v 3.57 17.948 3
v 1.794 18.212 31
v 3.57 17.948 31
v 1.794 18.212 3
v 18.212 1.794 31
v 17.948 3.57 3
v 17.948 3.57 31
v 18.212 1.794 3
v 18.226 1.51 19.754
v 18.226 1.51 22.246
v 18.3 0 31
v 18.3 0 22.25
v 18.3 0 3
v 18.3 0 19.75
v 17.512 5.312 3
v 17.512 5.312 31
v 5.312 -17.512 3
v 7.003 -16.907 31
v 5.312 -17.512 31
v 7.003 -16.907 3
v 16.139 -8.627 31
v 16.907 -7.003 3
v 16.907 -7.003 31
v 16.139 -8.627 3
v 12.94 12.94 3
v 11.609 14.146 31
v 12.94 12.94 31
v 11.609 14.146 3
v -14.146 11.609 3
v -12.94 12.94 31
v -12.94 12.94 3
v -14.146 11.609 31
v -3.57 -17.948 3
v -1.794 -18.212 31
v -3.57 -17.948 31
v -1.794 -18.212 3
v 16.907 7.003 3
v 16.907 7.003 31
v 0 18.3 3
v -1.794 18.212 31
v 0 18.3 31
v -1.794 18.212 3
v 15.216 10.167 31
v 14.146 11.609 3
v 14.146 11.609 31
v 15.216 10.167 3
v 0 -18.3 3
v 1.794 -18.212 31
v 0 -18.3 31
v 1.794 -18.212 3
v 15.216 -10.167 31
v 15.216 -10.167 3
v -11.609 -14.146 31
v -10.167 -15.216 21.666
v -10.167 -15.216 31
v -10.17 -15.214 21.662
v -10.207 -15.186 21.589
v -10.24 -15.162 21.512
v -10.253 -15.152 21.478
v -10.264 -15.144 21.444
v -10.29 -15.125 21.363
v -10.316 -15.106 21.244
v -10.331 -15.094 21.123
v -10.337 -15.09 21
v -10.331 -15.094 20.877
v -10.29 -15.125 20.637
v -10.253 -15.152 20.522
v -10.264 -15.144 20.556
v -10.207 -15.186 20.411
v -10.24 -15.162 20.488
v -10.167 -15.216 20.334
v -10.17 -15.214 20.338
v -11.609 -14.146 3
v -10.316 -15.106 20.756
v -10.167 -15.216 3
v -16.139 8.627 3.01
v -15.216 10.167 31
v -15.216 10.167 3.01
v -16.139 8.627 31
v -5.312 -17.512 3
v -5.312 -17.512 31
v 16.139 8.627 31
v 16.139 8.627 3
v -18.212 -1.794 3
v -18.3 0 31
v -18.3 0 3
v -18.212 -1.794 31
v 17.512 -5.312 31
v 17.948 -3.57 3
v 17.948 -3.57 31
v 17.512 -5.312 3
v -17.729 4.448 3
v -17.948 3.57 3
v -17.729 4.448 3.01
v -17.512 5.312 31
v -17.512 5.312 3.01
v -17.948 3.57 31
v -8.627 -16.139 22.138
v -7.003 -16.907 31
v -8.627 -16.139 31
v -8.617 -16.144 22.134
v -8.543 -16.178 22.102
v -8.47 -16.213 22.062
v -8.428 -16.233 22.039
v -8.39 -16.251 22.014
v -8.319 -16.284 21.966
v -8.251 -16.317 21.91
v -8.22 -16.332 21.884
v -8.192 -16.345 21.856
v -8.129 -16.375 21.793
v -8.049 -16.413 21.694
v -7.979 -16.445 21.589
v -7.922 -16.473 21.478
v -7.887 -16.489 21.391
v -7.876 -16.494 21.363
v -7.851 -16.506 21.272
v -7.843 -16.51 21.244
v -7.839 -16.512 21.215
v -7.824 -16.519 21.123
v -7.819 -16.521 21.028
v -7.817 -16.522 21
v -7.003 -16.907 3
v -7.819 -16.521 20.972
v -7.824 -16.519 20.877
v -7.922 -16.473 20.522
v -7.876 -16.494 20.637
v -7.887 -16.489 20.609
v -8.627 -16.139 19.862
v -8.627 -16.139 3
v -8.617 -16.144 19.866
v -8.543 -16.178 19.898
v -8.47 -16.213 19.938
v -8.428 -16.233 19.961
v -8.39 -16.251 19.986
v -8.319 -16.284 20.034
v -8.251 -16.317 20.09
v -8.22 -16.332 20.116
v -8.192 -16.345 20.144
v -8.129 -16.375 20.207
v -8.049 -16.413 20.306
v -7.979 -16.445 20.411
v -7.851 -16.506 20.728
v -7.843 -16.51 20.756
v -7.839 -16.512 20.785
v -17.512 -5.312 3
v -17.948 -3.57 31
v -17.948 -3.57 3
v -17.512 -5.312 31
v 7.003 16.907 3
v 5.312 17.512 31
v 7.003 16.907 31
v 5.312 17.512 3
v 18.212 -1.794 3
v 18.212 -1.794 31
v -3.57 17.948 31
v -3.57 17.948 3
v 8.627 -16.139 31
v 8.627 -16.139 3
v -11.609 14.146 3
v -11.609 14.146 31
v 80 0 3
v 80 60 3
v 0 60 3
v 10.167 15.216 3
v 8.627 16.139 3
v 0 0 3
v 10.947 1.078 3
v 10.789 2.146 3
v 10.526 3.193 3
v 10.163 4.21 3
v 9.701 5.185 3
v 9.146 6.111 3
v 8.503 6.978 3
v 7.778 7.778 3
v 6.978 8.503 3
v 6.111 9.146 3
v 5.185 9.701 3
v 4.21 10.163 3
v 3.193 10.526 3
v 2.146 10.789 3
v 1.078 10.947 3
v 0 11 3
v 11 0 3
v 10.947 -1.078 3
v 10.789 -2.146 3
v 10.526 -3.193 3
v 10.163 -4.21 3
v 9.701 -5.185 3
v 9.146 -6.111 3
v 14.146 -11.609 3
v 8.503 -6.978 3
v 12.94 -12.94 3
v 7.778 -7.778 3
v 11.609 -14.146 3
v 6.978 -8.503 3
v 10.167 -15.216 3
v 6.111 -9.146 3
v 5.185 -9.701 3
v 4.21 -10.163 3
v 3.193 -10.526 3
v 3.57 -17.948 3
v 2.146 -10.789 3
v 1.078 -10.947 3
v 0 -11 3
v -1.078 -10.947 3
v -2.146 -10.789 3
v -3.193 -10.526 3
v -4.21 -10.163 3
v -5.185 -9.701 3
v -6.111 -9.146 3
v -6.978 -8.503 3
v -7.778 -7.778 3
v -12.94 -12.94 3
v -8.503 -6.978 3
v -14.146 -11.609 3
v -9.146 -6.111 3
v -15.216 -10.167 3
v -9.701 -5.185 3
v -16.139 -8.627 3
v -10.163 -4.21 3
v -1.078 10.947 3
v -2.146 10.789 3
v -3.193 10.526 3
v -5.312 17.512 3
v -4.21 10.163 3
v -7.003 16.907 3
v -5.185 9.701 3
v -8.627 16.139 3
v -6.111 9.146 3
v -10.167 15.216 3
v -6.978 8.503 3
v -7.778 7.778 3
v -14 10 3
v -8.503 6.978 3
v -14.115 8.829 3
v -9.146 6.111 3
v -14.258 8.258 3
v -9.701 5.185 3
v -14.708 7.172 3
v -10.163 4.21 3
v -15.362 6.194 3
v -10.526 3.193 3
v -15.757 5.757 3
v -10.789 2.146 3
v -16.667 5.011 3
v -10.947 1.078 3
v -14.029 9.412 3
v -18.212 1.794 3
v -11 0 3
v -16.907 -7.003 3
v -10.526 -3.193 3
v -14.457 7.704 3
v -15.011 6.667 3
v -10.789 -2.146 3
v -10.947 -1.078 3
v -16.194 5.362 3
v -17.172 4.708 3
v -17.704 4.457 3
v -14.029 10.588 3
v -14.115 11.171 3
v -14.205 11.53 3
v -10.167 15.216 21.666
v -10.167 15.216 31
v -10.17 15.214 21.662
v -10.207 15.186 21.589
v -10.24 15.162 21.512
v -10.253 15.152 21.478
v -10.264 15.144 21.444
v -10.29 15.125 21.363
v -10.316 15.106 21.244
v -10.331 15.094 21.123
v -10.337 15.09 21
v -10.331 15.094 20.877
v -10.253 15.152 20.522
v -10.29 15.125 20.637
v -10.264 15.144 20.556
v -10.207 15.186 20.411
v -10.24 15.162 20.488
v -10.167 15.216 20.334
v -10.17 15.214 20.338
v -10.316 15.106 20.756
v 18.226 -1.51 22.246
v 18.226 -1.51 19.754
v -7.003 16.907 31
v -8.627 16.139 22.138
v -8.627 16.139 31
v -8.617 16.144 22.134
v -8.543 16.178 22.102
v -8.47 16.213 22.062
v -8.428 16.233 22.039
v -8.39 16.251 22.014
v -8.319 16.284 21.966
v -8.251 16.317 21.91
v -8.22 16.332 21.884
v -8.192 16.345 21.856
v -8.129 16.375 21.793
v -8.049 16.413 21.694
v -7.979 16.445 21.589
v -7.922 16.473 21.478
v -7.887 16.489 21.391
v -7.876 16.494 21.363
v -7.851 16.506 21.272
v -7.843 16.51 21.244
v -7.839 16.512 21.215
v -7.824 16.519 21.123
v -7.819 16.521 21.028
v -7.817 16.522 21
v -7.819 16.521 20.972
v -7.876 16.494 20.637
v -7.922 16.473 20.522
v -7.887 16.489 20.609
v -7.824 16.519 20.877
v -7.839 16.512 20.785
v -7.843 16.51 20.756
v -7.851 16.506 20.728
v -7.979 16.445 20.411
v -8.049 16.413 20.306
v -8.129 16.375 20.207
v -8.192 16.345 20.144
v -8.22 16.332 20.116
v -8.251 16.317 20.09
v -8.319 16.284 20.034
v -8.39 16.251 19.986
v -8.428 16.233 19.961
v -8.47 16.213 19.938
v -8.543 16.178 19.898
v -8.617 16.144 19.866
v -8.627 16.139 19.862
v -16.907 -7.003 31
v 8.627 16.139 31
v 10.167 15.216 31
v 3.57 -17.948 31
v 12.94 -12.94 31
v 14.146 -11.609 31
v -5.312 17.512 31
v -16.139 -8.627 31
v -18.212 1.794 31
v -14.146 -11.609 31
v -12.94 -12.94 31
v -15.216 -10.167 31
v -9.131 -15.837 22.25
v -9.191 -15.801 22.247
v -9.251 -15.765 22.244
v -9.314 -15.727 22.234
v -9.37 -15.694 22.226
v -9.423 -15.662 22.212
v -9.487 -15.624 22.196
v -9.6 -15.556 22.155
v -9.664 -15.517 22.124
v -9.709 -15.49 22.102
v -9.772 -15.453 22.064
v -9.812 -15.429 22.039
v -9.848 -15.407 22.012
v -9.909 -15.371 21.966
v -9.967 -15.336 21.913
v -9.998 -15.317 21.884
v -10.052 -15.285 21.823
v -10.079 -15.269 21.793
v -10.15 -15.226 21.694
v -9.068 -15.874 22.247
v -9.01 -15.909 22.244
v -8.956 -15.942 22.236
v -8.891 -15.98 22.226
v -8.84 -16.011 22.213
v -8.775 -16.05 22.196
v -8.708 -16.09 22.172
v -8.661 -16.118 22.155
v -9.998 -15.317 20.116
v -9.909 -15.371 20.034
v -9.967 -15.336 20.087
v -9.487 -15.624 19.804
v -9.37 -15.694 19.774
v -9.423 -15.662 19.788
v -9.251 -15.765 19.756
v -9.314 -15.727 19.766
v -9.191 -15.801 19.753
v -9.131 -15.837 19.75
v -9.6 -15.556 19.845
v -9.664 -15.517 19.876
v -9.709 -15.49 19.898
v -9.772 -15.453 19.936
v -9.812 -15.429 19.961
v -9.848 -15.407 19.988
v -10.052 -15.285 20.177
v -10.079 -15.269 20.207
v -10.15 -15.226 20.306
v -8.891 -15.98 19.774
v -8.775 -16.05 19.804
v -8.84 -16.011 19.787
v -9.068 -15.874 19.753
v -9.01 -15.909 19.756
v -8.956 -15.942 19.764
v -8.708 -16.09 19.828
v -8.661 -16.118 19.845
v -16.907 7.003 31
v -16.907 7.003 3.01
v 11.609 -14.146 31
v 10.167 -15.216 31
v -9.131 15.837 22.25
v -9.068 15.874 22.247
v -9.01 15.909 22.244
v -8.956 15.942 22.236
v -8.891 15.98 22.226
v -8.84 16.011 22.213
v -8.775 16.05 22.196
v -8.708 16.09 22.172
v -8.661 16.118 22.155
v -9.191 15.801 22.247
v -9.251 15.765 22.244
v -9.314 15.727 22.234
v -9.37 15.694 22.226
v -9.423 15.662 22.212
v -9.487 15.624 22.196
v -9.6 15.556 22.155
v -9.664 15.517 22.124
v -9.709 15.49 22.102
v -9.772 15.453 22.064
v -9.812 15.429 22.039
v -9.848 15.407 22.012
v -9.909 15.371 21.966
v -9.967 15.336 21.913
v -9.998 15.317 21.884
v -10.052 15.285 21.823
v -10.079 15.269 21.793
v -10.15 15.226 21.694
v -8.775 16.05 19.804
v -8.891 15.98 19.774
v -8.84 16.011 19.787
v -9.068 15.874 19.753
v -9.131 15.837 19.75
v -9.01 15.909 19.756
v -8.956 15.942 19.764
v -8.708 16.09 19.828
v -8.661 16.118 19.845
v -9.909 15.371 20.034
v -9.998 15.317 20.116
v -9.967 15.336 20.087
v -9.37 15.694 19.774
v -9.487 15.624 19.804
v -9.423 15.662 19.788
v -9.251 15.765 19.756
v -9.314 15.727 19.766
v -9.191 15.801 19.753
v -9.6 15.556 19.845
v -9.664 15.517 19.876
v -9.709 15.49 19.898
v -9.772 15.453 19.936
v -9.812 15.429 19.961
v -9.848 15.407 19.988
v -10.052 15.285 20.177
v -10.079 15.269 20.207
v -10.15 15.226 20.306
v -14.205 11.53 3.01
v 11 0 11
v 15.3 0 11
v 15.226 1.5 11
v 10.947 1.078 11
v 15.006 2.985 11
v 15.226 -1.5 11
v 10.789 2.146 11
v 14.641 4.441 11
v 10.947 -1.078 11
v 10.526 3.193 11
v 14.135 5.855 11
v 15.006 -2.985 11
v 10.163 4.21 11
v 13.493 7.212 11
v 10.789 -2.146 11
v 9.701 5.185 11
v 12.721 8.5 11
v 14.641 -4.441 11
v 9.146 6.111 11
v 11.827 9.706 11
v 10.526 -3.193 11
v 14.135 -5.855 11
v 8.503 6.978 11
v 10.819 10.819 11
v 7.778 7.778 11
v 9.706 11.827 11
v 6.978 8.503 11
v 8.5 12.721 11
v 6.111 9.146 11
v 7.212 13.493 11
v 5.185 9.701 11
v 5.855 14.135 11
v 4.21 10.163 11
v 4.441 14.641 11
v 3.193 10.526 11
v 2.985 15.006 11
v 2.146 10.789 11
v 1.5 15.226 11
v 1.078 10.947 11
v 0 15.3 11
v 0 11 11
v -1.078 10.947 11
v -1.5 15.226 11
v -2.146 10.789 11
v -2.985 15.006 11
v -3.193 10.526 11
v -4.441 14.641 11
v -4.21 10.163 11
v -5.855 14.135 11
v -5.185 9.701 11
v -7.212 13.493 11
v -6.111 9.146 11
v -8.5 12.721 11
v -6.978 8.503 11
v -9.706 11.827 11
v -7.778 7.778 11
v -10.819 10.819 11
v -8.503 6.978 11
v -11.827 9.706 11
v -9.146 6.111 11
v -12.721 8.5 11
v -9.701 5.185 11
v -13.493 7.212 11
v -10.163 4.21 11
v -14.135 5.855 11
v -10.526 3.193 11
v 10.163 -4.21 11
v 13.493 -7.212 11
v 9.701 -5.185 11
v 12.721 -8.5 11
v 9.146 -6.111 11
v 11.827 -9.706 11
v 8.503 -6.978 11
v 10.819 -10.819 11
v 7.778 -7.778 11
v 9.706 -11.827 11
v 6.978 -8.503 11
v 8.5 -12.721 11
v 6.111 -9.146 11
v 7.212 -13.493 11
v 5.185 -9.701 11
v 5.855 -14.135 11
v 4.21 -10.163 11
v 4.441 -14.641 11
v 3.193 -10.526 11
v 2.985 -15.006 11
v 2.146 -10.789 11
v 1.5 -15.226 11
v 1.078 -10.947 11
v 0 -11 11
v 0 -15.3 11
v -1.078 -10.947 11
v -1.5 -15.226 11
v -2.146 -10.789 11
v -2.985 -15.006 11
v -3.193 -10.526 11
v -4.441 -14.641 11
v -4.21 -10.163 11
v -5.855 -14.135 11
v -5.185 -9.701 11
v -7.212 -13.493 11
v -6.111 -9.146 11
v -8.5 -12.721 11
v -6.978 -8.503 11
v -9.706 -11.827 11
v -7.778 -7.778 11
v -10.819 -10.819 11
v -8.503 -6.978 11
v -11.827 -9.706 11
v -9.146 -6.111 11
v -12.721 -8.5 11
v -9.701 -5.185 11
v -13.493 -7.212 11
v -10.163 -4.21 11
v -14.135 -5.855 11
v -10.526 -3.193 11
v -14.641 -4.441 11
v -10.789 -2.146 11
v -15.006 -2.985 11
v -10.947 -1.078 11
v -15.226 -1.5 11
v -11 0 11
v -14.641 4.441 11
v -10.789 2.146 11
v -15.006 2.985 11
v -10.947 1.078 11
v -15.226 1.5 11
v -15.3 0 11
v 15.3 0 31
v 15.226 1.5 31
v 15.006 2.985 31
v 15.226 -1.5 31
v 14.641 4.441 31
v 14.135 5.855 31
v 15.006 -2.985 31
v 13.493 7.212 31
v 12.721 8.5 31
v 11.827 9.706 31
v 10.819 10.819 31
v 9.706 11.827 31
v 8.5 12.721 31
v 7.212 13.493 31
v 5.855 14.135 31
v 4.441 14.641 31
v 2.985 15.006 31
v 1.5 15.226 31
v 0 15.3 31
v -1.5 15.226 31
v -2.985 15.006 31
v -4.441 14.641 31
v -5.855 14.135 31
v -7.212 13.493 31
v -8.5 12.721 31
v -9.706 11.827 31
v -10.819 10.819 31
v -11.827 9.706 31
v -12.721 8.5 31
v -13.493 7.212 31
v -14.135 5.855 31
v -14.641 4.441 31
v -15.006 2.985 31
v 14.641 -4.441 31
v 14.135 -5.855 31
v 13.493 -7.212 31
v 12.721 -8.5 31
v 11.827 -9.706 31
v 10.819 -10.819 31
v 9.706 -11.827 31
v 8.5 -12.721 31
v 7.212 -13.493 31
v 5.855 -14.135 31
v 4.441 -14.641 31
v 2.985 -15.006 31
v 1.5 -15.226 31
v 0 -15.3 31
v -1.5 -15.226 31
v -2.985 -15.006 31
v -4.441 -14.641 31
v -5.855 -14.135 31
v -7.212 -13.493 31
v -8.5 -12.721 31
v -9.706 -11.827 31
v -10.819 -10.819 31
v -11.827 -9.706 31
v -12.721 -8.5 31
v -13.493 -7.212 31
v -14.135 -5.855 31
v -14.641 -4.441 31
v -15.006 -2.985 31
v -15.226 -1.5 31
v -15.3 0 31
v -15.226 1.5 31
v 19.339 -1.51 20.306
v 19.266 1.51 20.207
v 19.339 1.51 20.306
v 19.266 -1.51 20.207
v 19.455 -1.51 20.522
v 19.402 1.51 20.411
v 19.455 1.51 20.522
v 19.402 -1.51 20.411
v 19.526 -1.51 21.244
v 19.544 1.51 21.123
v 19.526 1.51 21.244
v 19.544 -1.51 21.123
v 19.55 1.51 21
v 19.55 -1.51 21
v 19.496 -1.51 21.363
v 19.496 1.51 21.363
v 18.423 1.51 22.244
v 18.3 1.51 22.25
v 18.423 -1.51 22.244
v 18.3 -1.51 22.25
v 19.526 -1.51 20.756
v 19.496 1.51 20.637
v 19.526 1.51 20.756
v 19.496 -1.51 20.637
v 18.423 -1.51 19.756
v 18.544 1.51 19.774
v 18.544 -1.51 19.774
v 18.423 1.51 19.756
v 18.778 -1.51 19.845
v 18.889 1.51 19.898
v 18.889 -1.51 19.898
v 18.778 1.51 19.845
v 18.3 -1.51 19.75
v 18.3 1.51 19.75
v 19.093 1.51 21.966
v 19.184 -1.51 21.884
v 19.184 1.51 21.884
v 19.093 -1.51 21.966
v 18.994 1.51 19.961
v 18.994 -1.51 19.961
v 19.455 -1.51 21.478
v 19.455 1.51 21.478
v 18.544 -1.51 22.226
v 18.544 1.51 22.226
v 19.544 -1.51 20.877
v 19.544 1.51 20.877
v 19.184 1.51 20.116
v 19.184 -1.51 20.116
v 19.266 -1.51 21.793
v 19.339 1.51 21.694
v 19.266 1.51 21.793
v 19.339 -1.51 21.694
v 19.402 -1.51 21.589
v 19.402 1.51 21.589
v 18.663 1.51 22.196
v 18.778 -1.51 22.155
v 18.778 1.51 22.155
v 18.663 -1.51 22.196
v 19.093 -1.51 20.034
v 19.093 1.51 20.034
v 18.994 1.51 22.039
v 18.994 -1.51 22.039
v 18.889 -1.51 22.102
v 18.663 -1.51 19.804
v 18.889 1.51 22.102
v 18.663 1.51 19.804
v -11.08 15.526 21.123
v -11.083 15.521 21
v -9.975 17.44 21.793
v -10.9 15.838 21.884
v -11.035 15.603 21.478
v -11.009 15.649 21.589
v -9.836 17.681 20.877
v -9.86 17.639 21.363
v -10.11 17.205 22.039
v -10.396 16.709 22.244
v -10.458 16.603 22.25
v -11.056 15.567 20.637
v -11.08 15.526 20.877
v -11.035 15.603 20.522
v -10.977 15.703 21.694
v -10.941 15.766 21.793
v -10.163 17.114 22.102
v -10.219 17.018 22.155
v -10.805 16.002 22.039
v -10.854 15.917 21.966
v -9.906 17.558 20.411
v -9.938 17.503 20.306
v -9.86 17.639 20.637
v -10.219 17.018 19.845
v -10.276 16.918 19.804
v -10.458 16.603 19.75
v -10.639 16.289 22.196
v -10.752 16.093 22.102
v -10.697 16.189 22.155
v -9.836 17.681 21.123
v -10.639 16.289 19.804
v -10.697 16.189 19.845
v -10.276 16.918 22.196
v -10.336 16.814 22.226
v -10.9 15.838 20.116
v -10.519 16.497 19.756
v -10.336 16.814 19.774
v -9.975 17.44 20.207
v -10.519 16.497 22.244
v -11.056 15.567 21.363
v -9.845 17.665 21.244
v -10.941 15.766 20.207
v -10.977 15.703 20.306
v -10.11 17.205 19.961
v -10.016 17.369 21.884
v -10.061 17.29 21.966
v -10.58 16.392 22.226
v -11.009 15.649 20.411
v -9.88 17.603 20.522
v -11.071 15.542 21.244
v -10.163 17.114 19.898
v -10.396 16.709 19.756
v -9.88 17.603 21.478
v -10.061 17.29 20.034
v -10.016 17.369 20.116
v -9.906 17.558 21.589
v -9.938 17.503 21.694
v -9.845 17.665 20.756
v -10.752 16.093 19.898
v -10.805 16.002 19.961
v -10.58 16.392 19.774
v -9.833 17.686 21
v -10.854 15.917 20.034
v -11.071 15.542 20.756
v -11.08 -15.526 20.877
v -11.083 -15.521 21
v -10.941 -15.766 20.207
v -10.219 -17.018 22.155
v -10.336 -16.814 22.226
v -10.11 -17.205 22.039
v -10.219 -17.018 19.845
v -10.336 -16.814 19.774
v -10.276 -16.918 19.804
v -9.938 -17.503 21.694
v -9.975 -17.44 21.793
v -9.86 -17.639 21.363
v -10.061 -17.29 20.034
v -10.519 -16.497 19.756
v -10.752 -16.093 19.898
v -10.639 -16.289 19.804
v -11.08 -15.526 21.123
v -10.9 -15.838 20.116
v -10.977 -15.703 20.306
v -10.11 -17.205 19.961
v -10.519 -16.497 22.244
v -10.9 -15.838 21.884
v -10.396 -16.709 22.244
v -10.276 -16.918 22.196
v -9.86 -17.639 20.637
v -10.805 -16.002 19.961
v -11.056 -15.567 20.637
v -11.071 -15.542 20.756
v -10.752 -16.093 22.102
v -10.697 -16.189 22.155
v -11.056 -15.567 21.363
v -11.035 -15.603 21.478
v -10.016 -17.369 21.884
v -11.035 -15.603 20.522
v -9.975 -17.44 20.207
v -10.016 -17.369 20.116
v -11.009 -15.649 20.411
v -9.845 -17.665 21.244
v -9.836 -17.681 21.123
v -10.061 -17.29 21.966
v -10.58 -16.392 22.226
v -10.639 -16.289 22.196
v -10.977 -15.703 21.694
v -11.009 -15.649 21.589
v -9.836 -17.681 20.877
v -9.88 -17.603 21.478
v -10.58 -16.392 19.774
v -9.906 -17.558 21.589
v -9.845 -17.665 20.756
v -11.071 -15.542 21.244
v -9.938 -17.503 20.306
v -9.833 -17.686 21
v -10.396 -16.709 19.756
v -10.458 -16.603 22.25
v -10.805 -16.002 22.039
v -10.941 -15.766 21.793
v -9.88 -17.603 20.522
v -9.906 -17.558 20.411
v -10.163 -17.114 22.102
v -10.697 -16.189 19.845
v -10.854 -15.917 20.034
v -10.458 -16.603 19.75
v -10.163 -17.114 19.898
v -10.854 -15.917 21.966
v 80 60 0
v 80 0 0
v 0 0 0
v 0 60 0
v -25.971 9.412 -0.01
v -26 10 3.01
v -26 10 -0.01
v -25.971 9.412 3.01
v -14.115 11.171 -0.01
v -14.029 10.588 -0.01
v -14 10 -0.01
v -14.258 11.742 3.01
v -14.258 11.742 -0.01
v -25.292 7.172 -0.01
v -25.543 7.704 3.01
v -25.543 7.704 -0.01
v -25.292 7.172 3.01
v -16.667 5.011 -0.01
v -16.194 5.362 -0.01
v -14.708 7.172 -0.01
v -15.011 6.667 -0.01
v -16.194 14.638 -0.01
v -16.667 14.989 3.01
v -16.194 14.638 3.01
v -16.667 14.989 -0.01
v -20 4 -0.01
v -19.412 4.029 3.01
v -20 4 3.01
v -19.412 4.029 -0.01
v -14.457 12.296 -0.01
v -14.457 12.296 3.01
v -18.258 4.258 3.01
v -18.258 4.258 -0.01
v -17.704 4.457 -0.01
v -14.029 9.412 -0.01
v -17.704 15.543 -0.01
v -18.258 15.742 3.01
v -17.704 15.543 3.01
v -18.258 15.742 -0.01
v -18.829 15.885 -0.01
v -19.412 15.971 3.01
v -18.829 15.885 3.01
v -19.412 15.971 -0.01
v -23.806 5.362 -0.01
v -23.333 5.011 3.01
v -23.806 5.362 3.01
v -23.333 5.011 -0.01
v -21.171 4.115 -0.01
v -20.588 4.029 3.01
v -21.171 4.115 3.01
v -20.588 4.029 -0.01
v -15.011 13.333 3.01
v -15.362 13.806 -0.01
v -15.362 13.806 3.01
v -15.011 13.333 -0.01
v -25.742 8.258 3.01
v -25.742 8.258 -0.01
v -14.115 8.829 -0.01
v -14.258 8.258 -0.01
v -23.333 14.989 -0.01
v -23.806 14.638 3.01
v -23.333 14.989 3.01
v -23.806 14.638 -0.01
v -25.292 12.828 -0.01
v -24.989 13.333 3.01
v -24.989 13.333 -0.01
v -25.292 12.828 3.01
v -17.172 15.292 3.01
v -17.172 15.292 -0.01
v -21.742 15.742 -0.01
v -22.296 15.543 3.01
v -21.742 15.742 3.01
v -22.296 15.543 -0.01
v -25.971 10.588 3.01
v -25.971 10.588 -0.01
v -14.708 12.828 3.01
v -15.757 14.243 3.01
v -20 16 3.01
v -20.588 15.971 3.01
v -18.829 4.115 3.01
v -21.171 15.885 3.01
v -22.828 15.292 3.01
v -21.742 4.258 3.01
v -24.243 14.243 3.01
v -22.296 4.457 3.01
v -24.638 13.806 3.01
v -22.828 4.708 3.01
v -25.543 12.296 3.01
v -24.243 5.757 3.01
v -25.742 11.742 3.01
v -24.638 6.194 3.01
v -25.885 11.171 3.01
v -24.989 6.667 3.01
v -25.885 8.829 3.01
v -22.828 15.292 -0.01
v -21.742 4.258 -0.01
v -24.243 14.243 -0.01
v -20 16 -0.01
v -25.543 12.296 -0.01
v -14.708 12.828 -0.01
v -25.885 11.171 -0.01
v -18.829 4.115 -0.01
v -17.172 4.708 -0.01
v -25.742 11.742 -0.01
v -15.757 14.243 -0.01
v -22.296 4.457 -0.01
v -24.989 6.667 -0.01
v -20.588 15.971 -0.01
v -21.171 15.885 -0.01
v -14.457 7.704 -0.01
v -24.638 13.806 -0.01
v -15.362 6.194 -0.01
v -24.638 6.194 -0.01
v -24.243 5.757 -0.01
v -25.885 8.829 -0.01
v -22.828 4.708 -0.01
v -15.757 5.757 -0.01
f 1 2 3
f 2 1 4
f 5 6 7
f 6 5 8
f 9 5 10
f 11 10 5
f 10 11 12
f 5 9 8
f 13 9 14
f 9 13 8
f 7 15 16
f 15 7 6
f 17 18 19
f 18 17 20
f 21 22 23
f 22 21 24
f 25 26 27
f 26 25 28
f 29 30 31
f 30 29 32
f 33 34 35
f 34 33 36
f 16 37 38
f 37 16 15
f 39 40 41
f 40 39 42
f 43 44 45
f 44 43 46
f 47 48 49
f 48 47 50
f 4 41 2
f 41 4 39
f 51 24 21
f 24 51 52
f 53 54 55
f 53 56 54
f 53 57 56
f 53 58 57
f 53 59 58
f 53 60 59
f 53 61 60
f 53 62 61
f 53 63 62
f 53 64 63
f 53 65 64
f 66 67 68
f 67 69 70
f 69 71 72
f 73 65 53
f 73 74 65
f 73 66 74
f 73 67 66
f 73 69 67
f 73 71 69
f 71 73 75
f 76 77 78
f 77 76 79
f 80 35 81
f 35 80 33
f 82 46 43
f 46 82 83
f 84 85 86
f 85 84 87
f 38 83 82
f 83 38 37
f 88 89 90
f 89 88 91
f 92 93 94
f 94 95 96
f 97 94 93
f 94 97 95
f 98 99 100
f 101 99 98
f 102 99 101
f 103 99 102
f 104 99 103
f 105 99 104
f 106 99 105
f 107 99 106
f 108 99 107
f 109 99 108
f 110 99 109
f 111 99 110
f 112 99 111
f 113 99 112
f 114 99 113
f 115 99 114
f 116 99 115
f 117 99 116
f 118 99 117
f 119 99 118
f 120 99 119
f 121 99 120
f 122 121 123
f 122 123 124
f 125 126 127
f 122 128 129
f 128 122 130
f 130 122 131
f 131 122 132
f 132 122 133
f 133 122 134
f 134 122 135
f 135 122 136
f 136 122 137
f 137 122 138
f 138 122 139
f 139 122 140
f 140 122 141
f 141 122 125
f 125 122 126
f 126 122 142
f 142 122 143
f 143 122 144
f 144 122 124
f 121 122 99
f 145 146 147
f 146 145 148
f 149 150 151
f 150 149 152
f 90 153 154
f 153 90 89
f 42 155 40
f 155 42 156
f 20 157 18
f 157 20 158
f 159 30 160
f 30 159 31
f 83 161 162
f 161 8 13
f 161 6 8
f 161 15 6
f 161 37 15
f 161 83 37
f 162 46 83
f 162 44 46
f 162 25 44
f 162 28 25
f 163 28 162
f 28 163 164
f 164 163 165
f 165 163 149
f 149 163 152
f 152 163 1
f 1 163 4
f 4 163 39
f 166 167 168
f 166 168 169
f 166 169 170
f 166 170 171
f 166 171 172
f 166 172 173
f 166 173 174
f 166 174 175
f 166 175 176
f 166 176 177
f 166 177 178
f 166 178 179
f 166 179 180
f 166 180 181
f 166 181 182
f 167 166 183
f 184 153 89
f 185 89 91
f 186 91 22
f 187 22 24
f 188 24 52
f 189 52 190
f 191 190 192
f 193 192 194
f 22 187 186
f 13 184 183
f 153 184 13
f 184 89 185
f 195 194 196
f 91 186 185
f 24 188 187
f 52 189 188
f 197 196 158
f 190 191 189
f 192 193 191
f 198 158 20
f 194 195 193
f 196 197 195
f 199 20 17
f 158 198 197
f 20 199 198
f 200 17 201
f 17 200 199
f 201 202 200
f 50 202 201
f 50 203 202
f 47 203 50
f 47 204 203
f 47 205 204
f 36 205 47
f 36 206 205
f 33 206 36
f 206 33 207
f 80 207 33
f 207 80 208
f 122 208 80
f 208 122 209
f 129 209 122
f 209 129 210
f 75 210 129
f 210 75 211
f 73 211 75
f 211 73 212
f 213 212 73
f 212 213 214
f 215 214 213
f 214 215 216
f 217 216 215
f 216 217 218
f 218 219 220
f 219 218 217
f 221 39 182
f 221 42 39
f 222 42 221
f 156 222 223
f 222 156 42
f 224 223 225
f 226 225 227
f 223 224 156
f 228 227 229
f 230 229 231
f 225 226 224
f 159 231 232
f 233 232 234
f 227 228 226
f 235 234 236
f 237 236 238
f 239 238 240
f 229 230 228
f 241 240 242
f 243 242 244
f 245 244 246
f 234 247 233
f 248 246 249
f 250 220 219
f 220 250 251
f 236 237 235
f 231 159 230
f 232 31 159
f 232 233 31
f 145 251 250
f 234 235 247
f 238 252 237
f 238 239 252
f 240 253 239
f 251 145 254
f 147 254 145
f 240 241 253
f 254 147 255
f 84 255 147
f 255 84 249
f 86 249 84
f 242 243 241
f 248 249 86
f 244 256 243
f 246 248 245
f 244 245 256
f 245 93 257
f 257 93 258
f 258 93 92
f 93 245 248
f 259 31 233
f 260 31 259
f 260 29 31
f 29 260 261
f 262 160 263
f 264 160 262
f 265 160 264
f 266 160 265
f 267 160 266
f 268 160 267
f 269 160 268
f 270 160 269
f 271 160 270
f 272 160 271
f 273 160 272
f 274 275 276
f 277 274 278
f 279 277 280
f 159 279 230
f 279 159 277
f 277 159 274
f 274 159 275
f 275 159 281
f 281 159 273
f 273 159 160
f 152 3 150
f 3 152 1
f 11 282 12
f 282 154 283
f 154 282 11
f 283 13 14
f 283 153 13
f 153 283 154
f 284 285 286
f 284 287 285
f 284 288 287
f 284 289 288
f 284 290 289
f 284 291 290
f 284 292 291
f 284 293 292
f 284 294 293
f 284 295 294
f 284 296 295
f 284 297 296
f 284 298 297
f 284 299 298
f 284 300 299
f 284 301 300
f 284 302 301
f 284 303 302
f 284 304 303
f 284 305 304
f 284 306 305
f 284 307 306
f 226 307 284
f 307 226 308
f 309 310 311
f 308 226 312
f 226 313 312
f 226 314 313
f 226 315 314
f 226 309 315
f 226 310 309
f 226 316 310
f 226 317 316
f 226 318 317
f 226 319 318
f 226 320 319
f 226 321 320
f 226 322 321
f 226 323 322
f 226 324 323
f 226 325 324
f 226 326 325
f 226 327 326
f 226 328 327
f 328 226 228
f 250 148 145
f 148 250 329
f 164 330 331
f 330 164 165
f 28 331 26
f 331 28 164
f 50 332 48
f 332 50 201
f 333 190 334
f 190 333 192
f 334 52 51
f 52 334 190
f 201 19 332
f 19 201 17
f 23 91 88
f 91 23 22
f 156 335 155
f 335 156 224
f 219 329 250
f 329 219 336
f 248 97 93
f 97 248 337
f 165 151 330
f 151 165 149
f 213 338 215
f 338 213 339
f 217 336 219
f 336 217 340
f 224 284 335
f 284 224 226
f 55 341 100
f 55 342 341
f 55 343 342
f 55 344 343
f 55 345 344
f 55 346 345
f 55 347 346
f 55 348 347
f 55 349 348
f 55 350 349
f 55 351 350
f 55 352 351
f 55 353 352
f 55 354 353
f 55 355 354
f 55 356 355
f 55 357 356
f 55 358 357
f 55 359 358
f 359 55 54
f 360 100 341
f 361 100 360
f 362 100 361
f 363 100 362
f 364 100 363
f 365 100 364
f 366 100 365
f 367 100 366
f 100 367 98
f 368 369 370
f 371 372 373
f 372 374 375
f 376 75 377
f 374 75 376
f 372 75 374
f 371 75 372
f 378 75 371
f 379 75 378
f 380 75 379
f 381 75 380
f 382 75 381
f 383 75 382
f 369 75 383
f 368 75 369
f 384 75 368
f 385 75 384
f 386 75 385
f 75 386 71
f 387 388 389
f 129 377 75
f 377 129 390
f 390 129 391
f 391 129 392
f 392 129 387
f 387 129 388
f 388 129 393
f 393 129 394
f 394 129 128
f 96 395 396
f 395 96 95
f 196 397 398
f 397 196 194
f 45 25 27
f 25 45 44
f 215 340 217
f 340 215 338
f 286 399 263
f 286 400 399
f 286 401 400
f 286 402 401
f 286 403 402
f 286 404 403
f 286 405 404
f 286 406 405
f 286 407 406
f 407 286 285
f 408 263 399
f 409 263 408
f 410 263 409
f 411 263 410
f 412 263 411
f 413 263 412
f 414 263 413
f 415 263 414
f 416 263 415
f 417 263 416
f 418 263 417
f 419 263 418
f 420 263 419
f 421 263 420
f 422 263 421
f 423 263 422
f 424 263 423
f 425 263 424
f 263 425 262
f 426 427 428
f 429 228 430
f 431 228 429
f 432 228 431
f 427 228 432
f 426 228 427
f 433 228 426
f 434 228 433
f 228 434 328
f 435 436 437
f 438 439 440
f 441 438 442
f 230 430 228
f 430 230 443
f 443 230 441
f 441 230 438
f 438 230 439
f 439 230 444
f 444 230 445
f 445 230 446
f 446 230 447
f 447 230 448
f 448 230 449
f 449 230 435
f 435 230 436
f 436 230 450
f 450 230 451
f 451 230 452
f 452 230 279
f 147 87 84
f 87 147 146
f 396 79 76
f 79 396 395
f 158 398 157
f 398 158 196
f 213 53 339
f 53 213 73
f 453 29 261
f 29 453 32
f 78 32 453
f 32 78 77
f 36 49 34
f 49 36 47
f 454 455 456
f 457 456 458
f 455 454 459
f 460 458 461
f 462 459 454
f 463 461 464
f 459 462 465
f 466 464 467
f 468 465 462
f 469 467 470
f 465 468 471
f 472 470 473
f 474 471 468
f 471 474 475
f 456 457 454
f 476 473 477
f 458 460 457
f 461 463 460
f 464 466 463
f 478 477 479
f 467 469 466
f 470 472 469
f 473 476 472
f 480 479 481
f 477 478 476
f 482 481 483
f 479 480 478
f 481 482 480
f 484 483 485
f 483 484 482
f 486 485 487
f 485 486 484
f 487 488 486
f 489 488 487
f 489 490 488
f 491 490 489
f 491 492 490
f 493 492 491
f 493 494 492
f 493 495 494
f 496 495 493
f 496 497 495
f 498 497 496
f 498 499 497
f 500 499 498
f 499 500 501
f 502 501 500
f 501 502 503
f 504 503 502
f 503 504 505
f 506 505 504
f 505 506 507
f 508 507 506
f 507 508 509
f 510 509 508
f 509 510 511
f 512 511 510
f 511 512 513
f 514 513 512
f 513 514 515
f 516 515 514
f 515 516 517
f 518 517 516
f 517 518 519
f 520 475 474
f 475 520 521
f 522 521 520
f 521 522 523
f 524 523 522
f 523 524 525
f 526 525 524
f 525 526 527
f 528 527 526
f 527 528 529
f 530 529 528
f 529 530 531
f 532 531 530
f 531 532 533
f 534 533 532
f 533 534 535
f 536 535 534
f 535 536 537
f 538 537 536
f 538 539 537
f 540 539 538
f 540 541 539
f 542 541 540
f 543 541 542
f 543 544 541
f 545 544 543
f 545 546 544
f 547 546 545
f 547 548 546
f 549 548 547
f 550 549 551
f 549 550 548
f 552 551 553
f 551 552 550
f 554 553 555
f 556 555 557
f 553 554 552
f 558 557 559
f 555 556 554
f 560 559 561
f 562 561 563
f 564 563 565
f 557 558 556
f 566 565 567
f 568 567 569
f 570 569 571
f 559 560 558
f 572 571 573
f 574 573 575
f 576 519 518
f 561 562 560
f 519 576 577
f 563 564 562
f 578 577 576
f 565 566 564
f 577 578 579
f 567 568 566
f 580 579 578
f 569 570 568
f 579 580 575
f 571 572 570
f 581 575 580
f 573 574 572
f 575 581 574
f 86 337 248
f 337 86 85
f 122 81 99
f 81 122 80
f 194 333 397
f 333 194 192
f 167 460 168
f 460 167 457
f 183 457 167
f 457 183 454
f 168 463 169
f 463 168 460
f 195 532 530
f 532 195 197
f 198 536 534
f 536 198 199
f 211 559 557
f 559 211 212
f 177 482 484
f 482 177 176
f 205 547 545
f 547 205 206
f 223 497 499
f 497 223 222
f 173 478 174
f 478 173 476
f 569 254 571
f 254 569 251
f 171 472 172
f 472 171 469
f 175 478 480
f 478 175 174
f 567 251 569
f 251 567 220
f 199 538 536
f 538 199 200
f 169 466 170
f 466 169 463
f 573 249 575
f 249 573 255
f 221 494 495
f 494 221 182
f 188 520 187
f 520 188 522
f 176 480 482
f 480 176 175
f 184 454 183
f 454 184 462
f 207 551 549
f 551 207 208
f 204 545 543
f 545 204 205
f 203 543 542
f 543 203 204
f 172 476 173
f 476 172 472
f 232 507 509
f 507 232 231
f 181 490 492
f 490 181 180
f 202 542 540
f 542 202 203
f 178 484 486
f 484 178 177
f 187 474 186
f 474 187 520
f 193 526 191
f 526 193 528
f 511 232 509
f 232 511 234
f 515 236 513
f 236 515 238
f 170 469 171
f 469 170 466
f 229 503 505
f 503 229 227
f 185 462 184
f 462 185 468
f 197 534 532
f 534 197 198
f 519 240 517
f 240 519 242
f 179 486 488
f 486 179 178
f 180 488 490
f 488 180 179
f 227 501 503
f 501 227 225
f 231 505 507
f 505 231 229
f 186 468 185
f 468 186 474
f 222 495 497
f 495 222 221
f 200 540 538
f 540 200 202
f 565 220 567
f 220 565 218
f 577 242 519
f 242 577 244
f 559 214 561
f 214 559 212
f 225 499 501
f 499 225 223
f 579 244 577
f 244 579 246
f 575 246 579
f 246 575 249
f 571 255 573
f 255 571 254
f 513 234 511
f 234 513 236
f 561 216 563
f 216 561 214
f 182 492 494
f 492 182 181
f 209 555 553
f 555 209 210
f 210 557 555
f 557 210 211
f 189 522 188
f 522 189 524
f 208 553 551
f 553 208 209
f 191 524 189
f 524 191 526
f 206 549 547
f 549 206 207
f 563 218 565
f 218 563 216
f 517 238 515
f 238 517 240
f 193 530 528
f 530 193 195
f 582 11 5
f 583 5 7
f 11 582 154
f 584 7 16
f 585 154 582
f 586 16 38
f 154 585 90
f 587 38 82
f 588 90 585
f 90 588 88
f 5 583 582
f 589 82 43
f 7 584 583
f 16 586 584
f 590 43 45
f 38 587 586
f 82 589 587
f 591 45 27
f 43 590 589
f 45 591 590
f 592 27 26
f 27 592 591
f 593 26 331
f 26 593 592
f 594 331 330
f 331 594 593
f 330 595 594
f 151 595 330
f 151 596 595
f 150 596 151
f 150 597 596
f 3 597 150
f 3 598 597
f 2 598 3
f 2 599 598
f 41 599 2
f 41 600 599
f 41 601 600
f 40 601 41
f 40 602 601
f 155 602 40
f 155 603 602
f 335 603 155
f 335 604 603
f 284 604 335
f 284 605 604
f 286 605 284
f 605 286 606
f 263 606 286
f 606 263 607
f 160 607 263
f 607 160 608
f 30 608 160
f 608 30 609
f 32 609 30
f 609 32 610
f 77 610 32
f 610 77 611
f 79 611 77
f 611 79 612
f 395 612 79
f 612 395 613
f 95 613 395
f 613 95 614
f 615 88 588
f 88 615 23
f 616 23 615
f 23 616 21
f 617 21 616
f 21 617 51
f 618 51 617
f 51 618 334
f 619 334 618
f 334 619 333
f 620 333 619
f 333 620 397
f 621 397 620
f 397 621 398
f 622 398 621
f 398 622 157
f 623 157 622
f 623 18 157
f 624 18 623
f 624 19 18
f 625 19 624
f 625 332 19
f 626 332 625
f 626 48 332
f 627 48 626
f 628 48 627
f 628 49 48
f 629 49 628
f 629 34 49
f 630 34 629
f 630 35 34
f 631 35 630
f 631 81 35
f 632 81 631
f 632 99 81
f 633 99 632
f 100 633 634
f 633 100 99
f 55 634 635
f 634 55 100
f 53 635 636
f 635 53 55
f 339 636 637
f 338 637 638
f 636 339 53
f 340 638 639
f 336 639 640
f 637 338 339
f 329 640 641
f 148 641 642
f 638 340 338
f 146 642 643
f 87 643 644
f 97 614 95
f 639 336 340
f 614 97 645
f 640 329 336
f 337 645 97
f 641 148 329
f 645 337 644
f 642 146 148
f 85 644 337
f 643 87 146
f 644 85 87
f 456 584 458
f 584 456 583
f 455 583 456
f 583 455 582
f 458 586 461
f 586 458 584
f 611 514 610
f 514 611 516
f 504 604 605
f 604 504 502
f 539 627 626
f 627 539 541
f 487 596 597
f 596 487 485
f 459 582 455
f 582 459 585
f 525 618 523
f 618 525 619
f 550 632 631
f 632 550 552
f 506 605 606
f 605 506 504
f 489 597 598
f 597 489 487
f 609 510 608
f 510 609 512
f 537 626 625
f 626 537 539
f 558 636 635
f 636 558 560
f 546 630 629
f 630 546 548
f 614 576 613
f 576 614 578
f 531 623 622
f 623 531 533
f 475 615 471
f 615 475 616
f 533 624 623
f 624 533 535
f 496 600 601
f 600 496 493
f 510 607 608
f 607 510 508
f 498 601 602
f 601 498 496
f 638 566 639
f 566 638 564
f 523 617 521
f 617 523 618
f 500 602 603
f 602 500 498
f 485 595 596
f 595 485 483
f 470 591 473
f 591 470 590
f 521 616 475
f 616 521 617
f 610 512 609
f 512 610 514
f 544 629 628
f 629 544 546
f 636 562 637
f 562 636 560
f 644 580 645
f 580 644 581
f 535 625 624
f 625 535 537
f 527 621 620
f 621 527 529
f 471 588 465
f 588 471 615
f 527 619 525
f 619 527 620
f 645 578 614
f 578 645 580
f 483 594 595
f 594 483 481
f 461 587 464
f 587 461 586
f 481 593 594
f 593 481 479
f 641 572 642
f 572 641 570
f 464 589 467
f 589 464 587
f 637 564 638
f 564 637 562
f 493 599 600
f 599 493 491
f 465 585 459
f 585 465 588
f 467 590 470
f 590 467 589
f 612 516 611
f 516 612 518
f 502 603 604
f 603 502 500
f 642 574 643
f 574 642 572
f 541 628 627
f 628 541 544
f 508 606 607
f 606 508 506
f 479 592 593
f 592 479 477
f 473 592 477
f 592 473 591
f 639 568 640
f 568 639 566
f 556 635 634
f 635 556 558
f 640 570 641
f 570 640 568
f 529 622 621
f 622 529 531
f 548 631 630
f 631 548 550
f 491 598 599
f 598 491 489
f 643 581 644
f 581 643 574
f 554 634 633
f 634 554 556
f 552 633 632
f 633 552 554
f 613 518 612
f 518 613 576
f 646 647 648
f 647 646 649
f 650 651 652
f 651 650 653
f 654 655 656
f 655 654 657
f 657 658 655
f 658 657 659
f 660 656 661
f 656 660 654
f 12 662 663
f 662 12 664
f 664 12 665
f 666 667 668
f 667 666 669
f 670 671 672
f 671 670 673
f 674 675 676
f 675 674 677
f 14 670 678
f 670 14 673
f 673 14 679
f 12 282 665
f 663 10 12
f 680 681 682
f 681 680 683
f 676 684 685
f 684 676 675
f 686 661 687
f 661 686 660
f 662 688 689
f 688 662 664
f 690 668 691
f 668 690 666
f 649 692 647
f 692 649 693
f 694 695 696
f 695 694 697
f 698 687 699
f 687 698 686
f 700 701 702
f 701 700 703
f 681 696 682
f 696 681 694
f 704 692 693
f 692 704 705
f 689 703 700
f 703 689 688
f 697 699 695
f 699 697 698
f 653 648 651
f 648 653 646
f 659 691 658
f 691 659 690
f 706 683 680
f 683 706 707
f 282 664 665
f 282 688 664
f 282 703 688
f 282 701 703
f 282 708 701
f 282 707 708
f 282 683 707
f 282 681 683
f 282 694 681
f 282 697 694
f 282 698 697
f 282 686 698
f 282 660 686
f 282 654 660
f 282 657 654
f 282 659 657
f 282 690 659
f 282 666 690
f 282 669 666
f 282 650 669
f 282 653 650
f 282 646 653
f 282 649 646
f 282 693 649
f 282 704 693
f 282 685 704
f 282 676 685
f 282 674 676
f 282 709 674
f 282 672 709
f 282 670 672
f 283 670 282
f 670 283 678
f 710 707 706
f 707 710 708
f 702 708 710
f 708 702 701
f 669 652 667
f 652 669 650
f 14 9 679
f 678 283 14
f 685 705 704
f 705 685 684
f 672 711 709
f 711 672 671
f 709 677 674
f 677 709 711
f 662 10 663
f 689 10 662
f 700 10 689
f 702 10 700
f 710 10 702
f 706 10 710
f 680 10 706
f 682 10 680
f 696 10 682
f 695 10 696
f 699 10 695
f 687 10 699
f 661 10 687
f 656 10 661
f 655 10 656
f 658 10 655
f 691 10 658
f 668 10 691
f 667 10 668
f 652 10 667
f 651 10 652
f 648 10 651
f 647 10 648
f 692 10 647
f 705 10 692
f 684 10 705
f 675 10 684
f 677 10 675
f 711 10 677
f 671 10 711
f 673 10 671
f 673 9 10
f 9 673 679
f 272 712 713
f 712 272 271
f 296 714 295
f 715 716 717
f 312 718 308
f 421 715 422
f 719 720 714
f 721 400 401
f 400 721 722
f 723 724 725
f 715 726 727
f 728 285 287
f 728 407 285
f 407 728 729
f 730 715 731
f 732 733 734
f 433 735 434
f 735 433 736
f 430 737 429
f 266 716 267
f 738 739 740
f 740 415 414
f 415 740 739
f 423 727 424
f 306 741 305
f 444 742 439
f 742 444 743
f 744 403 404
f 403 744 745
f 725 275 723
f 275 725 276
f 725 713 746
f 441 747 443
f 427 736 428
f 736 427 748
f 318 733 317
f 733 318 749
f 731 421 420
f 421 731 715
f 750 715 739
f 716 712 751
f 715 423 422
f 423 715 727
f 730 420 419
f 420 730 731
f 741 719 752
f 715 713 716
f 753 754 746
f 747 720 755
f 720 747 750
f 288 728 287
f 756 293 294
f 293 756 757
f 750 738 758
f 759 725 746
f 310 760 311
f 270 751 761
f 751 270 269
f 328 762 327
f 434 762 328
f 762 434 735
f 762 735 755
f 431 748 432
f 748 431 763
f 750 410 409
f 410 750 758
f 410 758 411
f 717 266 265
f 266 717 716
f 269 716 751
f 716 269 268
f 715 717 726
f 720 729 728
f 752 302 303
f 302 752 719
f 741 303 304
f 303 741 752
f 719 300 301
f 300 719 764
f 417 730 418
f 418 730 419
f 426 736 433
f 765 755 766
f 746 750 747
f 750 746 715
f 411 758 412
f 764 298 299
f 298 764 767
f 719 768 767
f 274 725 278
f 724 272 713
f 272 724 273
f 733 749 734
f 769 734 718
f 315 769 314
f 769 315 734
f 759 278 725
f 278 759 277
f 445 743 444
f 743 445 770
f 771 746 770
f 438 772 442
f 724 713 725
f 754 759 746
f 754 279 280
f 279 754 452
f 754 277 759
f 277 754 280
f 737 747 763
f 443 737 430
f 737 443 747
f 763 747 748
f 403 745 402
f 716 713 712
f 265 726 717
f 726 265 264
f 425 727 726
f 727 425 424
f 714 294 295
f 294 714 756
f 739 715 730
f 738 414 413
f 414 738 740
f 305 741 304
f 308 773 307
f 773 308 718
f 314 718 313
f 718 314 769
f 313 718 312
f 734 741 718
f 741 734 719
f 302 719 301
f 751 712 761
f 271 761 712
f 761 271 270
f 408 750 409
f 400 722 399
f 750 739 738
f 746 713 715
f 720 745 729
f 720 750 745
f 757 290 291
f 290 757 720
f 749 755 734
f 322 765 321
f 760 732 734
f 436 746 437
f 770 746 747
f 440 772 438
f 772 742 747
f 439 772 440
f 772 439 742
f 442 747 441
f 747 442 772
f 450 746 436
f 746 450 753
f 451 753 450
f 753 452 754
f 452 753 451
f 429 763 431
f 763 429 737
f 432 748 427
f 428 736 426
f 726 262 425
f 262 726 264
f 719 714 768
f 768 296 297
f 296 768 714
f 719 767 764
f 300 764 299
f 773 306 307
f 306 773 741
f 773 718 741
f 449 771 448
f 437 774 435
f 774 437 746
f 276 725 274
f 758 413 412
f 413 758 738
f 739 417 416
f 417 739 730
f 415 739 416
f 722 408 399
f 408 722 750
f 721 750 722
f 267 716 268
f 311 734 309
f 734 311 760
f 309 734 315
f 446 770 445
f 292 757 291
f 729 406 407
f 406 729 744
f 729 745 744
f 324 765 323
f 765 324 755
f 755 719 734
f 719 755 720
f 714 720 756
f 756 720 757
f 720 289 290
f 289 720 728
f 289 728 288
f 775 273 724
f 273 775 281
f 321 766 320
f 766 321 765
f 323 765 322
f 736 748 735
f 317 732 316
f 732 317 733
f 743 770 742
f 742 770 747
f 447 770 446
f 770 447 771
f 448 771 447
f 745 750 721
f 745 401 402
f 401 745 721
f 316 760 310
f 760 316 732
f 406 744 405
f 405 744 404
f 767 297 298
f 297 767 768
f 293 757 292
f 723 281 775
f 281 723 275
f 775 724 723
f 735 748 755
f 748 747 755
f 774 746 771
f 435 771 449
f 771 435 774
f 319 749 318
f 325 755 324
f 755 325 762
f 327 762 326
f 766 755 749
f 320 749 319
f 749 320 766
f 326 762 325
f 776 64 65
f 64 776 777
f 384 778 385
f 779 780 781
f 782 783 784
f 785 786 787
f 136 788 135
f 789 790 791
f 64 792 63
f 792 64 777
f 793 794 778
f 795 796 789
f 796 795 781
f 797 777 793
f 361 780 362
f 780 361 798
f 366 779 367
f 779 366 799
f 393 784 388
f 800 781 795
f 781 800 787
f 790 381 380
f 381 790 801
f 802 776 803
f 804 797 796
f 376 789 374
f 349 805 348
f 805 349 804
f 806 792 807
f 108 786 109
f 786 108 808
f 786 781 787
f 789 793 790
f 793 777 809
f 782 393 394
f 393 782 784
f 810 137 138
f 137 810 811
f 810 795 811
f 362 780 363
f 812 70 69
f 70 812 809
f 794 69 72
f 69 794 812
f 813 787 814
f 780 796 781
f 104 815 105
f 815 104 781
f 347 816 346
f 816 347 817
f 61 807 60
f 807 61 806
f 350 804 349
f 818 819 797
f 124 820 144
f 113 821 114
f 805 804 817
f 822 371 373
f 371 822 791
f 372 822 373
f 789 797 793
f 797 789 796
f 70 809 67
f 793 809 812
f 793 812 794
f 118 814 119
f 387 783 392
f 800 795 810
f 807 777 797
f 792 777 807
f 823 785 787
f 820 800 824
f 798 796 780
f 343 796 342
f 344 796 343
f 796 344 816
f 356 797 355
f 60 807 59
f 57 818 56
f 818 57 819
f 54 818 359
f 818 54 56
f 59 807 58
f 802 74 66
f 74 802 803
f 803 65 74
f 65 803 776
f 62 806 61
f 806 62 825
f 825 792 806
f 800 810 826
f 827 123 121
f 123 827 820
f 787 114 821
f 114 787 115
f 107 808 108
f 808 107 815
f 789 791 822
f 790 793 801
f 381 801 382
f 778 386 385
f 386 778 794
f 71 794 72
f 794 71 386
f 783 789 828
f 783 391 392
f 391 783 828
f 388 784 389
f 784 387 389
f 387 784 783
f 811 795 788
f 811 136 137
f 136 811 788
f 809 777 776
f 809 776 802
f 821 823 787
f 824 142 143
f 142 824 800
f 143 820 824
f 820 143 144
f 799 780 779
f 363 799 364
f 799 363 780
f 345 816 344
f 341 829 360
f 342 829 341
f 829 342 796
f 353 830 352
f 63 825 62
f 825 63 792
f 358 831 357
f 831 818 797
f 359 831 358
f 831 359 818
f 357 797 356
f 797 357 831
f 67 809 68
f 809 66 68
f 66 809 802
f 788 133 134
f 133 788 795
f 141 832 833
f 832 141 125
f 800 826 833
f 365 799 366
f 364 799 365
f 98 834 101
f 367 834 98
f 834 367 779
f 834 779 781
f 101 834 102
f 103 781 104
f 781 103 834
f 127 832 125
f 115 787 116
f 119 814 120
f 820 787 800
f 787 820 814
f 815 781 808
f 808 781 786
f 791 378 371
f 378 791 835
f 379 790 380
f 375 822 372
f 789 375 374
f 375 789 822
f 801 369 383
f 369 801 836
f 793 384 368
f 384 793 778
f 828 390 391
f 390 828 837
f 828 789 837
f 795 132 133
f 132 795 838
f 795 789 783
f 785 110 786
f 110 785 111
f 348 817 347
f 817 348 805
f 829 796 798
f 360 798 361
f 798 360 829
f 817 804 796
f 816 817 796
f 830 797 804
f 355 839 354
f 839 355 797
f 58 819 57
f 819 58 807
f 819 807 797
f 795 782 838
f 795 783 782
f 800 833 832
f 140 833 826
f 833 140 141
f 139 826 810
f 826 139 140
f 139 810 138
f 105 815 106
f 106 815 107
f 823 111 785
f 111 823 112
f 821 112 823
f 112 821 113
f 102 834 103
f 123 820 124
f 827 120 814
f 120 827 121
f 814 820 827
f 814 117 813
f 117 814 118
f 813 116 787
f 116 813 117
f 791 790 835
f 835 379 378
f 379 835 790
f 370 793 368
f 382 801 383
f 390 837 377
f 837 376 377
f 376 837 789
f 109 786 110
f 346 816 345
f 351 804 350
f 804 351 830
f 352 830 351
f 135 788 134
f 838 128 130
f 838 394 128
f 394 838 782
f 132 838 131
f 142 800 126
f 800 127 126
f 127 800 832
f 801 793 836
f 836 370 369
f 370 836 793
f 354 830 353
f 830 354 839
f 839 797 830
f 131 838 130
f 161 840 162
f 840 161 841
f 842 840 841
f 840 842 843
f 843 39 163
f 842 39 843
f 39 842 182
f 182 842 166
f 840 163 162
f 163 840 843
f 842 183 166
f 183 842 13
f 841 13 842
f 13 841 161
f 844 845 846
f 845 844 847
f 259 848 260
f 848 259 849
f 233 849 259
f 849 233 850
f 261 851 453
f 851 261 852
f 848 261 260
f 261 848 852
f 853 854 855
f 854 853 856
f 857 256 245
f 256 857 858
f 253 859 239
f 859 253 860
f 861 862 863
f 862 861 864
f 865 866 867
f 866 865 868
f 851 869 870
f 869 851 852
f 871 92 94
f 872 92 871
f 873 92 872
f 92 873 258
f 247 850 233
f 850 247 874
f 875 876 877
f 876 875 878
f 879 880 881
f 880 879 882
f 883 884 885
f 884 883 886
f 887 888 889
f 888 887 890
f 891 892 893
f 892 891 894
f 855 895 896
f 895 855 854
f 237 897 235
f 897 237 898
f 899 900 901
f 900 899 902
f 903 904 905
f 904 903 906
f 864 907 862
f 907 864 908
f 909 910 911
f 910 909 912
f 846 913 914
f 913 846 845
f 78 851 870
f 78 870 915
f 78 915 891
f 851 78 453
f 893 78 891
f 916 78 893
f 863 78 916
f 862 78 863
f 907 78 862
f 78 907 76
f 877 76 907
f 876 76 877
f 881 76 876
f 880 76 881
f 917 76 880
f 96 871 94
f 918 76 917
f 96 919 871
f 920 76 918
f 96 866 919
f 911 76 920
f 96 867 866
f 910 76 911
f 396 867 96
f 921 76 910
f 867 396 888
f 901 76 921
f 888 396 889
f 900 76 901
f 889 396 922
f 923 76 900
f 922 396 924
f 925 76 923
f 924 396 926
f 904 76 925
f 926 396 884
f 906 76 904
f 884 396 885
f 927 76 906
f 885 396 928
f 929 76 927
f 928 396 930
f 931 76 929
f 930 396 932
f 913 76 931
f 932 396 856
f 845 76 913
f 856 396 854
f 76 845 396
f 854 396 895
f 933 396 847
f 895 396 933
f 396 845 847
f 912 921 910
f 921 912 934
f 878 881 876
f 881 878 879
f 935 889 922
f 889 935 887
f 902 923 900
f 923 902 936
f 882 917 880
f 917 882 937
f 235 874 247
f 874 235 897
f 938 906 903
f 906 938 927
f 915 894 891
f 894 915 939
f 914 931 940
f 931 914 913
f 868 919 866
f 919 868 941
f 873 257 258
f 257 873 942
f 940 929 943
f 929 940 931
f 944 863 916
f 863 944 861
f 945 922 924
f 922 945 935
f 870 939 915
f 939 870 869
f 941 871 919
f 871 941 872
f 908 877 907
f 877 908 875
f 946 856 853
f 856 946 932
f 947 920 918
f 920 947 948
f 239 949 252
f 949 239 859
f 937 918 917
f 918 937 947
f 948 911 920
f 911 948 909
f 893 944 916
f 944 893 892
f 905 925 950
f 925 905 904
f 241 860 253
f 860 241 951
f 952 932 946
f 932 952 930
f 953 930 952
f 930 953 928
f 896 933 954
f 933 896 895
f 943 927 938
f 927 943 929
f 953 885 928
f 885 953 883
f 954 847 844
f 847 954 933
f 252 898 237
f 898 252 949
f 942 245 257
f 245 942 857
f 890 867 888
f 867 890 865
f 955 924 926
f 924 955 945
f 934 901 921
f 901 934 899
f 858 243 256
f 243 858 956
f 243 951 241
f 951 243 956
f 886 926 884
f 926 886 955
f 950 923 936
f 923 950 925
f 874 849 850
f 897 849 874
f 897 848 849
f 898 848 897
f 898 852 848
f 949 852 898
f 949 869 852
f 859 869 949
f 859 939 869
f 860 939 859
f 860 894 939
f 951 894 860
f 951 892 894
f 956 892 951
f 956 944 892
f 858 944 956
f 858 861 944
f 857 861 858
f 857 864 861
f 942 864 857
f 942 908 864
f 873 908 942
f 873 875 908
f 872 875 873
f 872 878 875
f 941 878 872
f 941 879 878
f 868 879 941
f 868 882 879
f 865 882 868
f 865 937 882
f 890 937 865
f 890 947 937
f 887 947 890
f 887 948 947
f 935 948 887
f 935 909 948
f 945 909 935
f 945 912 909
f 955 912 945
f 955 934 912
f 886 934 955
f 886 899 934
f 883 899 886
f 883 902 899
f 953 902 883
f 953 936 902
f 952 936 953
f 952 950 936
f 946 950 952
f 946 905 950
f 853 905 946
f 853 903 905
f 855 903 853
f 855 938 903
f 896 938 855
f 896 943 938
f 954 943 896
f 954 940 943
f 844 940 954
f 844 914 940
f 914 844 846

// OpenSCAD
// Adapter for phone camera over microscope eyepiece
// Dimensions measured with calipers

// Plate dimensions
plate_x = 80;
plate_y = 60;
plate_z = 3;

// Camera hole
camera_hole_dia = 12;
camera_hole_x = -20;
camera_hole_y = 10;

// Sleeve dimensions
sleeve_od = 36.6;
sleeve_id_lower = 22;
sleeve_id_upper = 30.6;
sleeve_z_start = 3;
sleeve_z_stop = 11;
sleeve_z_top = 31;

// Centering screws
screw_hole_dia = 2.5;
screw_z = 21;
screw_count = 3;
screw_angle_start = 0; // +X direction

$fn = 64;

// Base plate - positioned at z=0 to z=3
translate([0, 0, 0])
  cube([plate_x, plate_y, plate_z], center = false);

// Camera hole through plate - extends slightly past plate thickness
translate([camera_hole_x, camera_hole_y, -0.01])
  cylinder(h = plate_z + 0.02, r = camera_hole_dia / 2, center = false);

// Sleeve - lower section (z=3 to z=11) with 22mm bore
translate([0, 0, sleeve_z_start])
  difference() {
    cylinder(h = sleeve_z_stop - sleeve_z_start, r = sleeve_od / 2, center = false);
    cylinder(h = (sleeve_z_stop - sleeve_z_start) + 0.02, r = sleeve_id_lower / 2, center = false);
  }

// Sleeve - upper section (z=11 to z=31) with 30.6mm bore
translate([0, 0, sleeve_z_stop])
  difference() {
    cylinder(h = sleeve_z_top - sleeve_z_stop, r = sleeve_od / 2, center = false);
    cylinder(h = (sleeve_z_top - sleeve_z_stop) + 0.02, r = sleeve_id_upper / 2, center = false);
  }

// Three radial M3 centering screw holes at z=21
for (i = [0:screw_count-1]) {
  angle = screw_angle_start + i * (360 / screw_count);
  // Position on the sleeve wall at radius = sleeve_od/2
  x = (sleeve_od / 2) * cos(angle);
  y = (sleeve_od / 2) * sin(angle);
  
  // Hole goes radially through the sleeve wall
  // Wall thickness = (sleeve_od - sleeve_id_upper)/2 for upper section
  wall_thickness = (sleeve_od - sleeve_id_upper) / 2;
  
  translate([x, y, screw_z])
    rotate([90, 0, -angle]) // Orient hole radially
    cylinder(h = wall_thickness + 0.02, r = screw_hole_dia / 2, center = true);
}
